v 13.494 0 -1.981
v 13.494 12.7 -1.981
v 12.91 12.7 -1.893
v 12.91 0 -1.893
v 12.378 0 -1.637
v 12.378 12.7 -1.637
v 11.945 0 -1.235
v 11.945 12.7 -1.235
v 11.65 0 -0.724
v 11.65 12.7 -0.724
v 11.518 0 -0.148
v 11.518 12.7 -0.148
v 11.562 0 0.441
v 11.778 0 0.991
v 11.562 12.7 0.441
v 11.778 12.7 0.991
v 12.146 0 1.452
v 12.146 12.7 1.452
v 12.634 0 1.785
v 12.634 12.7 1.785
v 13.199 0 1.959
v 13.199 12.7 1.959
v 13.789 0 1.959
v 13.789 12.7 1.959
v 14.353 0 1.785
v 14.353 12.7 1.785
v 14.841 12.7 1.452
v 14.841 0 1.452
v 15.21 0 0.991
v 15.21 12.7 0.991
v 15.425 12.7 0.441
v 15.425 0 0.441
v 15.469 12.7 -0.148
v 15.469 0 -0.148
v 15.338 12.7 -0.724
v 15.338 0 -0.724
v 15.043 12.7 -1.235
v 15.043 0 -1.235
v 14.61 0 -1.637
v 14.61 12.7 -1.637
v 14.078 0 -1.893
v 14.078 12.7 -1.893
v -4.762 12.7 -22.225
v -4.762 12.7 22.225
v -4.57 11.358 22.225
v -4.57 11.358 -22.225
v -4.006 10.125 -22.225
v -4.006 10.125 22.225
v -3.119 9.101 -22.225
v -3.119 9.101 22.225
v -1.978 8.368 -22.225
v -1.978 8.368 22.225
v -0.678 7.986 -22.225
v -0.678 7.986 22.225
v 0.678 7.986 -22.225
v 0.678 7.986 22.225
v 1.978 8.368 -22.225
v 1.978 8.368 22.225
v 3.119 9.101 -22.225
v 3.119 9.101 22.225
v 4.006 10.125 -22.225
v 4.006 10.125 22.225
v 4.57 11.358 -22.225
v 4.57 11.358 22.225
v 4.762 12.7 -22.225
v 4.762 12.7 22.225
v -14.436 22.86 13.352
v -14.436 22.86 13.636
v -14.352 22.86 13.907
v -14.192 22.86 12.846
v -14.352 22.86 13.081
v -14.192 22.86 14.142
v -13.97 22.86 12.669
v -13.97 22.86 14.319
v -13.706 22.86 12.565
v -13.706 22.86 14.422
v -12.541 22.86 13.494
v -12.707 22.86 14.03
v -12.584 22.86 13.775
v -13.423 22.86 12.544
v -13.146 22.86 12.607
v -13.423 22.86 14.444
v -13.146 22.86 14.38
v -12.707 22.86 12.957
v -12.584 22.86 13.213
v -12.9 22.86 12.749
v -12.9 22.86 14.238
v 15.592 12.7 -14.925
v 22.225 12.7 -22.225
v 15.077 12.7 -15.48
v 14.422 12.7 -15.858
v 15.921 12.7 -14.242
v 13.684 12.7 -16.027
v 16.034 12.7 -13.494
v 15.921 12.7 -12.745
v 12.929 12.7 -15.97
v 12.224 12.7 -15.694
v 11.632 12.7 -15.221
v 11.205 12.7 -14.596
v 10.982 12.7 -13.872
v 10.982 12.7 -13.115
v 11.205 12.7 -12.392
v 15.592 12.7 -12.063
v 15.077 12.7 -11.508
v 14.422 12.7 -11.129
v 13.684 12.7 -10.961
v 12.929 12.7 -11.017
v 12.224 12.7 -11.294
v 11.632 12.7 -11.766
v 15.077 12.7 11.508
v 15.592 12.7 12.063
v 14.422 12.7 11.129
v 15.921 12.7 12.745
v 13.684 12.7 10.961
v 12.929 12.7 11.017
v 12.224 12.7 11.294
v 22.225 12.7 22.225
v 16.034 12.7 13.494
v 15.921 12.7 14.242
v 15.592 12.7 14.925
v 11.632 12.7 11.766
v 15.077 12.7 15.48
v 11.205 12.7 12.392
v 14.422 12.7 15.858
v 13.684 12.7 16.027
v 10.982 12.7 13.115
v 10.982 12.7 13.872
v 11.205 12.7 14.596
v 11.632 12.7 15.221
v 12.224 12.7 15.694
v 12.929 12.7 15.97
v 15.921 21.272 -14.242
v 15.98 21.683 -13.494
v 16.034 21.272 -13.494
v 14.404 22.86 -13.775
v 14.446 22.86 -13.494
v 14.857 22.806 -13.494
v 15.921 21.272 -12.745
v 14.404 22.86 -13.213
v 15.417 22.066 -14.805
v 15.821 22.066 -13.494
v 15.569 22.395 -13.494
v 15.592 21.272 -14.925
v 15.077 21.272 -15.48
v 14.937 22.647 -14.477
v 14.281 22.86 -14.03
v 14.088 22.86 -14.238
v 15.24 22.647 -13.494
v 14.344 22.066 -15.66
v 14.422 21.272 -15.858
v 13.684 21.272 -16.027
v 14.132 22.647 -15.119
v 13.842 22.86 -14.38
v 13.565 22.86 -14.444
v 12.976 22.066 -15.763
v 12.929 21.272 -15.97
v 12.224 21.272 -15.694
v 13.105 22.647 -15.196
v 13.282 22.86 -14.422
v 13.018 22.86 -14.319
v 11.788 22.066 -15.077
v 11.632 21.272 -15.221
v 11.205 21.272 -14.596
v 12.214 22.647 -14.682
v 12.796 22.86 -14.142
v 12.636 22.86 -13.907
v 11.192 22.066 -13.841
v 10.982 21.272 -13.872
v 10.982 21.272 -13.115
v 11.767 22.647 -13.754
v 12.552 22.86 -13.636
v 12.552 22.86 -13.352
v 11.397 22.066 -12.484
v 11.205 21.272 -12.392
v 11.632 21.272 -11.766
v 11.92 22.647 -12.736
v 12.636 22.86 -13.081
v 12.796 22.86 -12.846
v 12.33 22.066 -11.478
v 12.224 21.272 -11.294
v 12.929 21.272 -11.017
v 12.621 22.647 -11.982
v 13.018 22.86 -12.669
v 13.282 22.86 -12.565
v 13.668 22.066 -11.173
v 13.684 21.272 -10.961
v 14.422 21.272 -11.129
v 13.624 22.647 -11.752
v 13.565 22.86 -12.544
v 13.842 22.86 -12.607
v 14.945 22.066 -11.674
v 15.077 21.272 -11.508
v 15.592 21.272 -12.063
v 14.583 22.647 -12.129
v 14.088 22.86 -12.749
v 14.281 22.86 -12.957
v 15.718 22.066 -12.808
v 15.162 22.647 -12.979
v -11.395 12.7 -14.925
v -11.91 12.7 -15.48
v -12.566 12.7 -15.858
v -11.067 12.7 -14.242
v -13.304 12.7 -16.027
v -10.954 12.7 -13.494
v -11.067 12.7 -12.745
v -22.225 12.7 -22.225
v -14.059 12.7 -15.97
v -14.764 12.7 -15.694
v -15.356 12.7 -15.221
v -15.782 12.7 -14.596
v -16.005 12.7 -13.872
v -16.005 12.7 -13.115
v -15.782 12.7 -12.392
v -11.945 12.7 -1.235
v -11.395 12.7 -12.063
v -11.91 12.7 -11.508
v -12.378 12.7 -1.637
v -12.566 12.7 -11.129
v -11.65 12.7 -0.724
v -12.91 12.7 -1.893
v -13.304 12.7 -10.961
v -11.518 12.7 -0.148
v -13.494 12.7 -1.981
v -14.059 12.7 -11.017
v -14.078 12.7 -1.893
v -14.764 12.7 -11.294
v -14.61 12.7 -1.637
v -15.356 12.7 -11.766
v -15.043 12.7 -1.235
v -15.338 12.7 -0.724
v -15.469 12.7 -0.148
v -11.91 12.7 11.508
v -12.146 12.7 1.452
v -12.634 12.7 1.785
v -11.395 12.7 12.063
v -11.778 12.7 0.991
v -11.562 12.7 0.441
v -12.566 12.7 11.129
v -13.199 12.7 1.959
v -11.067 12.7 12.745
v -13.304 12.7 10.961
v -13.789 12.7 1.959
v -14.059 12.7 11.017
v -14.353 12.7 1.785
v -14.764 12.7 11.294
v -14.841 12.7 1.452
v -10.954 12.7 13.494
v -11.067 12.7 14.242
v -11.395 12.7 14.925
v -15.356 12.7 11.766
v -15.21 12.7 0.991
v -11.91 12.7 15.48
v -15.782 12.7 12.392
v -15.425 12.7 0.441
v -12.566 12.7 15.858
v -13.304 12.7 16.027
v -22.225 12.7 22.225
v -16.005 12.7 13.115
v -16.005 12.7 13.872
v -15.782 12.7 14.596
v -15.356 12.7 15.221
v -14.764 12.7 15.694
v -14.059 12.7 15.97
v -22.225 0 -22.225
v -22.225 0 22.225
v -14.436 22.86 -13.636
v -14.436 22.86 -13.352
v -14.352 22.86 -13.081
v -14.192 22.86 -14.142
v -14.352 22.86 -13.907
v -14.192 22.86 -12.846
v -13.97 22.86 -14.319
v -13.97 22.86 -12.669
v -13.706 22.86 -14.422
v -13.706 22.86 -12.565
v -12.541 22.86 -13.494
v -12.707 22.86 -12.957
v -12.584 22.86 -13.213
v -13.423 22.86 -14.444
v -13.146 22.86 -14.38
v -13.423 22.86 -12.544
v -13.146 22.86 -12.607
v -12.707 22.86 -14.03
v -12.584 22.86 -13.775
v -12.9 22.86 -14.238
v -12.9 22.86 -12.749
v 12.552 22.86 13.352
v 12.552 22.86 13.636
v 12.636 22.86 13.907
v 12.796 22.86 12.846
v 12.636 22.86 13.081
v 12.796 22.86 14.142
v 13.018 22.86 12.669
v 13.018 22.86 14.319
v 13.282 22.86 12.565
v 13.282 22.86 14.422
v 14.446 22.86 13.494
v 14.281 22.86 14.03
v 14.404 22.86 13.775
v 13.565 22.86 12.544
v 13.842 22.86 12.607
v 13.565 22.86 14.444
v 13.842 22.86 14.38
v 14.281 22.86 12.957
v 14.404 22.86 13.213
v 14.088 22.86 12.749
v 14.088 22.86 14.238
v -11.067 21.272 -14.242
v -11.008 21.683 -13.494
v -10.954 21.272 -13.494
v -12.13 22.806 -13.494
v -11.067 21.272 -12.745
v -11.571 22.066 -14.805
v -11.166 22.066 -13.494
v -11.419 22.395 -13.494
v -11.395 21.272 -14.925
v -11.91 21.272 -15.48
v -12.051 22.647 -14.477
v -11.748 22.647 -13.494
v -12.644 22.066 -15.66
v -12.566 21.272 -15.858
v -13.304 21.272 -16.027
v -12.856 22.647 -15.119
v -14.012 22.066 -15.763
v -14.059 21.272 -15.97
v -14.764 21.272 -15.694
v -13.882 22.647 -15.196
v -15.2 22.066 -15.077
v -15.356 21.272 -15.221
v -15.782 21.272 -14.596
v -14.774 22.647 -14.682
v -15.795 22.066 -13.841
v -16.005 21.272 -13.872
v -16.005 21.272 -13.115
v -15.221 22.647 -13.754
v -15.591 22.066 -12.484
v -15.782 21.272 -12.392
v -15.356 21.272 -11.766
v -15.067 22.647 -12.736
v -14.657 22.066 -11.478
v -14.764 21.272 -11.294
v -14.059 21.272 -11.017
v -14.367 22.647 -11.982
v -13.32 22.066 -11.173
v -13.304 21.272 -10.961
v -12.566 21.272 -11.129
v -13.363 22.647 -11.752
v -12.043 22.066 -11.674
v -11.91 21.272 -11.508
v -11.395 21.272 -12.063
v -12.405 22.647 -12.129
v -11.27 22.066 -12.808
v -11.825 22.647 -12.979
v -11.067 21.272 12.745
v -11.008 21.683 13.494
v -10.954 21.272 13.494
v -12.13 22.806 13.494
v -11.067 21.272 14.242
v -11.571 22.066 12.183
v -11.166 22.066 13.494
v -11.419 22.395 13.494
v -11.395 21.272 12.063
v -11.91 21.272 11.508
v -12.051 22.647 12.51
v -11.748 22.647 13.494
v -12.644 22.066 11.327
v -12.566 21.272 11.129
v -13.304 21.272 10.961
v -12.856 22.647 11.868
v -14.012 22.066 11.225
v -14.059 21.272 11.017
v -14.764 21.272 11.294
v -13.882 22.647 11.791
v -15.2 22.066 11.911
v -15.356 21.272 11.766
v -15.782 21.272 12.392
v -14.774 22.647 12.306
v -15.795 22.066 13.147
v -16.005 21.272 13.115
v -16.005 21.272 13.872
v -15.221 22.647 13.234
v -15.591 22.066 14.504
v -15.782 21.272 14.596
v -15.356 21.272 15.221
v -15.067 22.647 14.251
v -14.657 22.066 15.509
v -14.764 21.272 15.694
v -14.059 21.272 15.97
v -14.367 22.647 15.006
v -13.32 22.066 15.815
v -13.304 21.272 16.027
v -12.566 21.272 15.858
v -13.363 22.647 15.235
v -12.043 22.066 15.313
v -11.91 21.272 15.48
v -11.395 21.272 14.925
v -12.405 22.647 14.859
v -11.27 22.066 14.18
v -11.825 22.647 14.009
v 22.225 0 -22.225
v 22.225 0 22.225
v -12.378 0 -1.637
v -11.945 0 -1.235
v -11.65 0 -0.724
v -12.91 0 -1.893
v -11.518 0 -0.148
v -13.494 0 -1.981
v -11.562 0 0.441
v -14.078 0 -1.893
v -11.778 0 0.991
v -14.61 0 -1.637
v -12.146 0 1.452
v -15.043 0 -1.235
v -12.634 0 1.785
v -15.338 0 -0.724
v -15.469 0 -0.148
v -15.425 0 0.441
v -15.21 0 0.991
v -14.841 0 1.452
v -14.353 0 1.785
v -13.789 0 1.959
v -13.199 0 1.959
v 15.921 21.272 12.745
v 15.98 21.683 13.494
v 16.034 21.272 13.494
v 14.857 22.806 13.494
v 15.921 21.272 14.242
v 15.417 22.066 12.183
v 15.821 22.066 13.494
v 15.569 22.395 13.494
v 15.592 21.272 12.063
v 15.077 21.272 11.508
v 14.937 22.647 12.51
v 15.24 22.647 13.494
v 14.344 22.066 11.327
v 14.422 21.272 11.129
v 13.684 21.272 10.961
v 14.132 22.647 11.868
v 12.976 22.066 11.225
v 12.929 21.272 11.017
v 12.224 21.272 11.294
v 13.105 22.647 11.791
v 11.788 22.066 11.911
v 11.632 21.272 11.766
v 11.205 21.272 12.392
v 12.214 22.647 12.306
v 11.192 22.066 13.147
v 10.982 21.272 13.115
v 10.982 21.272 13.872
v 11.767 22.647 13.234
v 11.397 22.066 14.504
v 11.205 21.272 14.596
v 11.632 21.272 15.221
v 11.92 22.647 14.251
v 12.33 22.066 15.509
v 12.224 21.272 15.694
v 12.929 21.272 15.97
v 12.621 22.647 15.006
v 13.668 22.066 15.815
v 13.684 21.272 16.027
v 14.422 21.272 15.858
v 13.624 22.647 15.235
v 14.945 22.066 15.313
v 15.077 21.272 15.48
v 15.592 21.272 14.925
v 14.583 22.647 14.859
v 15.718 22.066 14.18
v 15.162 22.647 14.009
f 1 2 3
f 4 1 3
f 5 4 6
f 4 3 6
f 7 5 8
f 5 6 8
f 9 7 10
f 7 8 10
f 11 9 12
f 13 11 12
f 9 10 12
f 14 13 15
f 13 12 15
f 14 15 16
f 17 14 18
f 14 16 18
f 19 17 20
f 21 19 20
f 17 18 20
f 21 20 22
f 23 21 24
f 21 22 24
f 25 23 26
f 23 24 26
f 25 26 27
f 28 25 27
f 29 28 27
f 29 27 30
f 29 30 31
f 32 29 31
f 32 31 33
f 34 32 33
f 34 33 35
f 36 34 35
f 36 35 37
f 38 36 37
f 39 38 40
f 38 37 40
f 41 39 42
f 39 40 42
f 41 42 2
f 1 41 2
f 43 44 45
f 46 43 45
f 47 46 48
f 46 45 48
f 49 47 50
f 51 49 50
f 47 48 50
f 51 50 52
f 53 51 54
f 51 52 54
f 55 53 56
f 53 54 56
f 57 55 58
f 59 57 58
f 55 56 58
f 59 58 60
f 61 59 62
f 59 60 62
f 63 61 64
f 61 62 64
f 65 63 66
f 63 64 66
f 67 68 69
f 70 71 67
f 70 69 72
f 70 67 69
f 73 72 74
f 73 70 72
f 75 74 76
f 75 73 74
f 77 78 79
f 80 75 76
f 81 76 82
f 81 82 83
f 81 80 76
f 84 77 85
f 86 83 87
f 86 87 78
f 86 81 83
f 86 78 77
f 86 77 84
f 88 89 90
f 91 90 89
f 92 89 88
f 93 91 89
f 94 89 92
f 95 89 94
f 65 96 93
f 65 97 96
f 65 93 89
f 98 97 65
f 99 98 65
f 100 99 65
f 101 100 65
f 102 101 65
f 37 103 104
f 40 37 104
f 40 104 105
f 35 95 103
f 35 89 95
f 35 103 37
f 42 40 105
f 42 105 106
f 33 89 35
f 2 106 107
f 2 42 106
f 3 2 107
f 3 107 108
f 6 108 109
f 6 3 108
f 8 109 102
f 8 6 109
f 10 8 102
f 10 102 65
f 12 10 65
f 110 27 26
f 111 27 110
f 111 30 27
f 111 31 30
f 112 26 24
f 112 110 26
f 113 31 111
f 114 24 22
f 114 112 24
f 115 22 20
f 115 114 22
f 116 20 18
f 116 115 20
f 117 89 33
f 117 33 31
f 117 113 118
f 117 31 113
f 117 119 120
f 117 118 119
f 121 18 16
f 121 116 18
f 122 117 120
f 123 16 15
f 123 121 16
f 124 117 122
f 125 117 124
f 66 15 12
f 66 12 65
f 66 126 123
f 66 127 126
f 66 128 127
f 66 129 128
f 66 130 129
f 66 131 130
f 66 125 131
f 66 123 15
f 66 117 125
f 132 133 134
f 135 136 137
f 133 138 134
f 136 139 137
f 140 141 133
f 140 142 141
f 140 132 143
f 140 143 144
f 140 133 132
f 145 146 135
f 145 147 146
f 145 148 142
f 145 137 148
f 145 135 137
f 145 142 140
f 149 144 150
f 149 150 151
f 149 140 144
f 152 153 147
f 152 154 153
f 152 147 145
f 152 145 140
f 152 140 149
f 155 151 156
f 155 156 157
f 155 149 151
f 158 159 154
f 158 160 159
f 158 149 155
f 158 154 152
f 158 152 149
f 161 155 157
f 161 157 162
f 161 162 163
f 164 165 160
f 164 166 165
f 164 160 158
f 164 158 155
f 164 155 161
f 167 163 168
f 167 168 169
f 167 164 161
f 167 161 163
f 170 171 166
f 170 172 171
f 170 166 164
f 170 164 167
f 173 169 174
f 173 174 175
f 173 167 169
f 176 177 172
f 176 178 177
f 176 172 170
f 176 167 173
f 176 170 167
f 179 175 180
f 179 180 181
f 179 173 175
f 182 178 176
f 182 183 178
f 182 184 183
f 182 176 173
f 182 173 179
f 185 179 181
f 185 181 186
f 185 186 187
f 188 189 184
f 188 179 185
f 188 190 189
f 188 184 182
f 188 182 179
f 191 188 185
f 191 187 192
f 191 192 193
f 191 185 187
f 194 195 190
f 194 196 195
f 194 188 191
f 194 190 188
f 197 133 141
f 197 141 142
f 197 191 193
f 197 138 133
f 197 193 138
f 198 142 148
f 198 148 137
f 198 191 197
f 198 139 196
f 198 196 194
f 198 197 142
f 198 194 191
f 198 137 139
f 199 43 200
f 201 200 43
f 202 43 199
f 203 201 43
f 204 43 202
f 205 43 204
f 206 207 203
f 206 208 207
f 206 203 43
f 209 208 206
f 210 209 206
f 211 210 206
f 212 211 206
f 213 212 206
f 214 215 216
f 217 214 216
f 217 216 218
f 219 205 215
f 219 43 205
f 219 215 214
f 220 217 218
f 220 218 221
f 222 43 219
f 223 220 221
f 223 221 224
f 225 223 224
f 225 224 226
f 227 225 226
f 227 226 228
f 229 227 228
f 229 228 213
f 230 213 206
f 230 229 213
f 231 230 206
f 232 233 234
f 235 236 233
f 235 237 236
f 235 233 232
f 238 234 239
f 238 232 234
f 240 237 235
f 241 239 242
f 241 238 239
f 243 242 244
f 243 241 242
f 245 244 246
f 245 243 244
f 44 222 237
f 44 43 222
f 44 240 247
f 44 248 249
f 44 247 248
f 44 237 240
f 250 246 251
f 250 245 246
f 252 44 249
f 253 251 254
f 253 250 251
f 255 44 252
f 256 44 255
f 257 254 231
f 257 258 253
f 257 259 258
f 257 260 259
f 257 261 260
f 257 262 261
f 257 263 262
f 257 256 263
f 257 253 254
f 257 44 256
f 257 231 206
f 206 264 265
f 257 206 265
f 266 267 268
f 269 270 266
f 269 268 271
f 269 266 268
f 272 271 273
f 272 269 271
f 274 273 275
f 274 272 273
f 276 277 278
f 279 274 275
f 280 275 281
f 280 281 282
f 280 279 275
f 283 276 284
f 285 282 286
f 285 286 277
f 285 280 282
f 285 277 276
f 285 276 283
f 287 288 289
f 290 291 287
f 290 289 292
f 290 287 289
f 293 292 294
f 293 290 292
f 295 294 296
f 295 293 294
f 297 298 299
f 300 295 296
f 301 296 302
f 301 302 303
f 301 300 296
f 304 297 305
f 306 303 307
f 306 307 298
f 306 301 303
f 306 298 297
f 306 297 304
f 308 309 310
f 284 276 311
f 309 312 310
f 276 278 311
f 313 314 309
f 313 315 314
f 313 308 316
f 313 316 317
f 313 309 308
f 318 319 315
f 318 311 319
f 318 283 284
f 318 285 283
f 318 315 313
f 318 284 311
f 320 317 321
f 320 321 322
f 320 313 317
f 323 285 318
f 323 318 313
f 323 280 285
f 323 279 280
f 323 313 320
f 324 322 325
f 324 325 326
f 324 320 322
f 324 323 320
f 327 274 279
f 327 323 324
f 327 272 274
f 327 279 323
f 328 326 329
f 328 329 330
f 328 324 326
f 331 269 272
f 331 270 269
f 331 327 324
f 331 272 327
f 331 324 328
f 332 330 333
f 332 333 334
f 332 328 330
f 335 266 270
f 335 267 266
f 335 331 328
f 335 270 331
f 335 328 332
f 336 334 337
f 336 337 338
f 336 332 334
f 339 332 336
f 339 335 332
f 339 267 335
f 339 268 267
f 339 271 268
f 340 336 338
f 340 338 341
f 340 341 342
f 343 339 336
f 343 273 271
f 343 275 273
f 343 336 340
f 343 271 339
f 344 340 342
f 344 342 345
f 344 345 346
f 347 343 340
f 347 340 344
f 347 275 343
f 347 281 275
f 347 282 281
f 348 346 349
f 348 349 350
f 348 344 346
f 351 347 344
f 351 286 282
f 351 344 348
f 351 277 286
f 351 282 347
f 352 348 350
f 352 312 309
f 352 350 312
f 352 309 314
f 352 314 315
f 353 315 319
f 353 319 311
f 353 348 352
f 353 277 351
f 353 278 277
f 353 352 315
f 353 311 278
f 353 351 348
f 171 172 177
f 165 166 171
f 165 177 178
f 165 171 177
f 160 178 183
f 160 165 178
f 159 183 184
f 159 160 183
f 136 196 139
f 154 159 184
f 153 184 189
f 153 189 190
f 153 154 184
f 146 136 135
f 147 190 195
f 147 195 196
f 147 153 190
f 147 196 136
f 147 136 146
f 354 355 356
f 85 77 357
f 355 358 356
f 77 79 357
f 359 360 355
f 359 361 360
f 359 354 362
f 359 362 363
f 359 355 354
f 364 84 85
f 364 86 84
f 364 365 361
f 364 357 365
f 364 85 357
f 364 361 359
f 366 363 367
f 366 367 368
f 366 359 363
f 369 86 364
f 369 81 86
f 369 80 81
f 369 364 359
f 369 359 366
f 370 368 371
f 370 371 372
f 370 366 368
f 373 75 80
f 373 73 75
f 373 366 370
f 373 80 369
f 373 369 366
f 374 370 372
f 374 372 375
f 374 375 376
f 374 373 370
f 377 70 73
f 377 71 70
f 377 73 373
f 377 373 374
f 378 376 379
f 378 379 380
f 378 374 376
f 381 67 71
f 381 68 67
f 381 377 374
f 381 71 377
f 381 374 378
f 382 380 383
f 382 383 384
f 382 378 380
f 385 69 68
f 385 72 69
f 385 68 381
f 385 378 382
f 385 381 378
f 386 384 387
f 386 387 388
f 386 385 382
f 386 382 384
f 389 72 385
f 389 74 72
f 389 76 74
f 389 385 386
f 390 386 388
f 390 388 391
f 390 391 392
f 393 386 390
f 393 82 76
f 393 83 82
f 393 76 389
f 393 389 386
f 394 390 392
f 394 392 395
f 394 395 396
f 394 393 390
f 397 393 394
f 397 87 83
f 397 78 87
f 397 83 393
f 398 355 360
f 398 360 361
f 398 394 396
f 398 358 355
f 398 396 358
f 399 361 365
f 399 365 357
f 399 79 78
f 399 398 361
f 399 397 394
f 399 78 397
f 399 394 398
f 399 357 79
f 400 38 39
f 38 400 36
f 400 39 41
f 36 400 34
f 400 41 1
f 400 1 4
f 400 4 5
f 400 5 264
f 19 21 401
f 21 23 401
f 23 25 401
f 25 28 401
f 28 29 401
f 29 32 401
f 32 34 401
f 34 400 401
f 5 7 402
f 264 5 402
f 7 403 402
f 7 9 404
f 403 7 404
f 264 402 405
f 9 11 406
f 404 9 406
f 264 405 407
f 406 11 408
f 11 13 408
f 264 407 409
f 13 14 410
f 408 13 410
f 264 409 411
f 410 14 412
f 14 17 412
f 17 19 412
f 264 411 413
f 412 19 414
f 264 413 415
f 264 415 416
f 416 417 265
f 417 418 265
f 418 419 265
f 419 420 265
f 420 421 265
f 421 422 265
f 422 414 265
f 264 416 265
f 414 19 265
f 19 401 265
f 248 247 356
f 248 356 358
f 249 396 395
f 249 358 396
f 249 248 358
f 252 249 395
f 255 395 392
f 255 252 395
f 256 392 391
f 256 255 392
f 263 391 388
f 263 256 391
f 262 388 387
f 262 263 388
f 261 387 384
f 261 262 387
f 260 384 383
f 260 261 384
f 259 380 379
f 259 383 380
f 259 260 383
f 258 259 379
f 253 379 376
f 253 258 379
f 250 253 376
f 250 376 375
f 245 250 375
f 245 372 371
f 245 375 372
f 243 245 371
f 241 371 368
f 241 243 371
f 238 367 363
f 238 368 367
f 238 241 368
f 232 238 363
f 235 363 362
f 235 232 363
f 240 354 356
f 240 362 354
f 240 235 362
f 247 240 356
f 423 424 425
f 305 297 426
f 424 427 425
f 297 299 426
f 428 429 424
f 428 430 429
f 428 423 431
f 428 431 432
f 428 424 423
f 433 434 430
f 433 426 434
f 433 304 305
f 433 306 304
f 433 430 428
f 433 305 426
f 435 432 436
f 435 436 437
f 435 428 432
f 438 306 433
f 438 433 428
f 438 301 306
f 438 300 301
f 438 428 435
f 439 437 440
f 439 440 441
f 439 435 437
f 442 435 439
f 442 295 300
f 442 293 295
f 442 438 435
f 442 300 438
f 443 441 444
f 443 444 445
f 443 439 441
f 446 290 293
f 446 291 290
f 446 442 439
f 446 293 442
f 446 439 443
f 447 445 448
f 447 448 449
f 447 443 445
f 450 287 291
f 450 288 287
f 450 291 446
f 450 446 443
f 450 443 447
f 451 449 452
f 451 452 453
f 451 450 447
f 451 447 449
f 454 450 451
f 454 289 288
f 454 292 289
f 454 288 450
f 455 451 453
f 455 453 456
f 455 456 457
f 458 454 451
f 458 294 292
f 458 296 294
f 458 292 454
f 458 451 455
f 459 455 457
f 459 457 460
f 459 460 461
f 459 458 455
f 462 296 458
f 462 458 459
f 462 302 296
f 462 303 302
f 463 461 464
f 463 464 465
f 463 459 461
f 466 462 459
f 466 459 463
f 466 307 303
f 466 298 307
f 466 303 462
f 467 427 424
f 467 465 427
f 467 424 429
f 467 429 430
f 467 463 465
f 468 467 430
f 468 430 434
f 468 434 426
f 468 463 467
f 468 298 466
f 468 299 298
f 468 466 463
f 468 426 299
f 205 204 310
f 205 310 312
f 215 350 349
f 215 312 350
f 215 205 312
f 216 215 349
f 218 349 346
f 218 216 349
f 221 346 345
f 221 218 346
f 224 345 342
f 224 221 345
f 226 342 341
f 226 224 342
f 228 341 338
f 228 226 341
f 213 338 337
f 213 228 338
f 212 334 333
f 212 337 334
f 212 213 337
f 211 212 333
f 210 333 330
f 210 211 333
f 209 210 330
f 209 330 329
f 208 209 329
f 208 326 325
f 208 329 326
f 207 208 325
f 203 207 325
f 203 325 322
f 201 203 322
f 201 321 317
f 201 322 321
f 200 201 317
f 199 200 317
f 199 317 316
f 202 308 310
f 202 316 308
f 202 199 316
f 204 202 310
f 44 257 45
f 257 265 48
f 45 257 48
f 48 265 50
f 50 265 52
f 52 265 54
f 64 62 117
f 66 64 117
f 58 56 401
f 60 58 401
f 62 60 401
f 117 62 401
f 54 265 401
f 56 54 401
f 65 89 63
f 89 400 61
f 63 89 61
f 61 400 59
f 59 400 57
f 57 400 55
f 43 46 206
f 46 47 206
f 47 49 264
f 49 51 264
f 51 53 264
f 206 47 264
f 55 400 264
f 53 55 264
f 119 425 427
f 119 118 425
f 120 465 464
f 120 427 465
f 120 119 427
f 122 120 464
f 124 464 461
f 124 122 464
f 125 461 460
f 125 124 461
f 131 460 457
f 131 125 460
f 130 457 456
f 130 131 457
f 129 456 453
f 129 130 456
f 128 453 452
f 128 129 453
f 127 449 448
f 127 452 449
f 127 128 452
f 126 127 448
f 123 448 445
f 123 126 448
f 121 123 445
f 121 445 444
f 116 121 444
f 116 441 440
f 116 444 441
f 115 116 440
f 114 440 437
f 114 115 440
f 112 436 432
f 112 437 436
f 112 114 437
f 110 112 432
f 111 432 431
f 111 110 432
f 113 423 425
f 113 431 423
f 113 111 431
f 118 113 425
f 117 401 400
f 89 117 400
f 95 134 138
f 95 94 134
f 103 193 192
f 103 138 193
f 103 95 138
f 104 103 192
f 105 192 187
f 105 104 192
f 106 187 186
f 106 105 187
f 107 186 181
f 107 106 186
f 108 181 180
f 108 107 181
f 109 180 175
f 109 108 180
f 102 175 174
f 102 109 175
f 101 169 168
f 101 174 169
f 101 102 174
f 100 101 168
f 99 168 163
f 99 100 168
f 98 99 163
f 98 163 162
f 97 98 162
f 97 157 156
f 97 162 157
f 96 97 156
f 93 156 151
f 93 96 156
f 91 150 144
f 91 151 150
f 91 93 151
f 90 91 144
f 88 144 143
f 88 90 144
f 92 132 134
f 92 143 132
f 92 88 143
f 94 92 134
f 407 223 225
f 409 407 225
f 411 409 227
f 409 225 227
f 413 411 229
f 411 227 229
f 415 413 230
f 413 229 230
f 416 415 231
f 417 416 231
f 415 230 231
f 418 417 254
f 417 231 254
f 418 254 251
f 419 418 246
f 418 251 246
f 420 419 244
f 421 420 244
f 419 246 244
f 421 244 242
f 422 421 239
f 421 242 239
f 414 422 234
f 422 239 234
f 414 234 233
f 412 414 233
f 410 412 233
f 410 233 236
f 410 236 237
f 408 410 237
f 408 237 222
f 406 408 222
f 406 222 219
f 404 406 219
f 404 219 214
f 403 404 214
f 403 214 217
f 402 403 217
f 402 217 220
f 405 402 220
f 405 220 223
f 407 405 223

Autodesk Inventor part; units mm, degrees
ref_plane "YZ Plane" through (0, 0, 0) normal (1, 0, 0) x (0, 1, 0)
ref_plane "XZ Plane" through (0, 0, 0) normal (0, 1, 0) x (-1, 0, 0)
ref_plane "XY Plane" through (0, 0, 0) normal (0, 0, 1) x (1, 0, 0)
sketch "Sketch1" plane through (0, 0, 0) normal (0, 1, 0) x (-1, 0, 0)
  line L0 (-22.225, 22.225) -> (-22.225, -22.225)
  line L1 (-22.225, -22.225) -> (22.225, -22.225)
  line L2 (22.225, -22.225) -> (22.225, 22.225)
  line L3 (22.225, 22.225) -> (-22.225, 22.225)
  line L4 (-22.225, 22.225) -> (22.225, -22.225) construction
  line L5 (-22.225, -22.225) -> (22.225, 22.225) construction
  point P0 (0, 0)
  dimension "d0" = 44.45
extrude "Extrusion1" add sketch "Sketch1" along normal blind 12.7
sketch "Sketch2" plane through (-22.225, 0, 22.225) normal (0, 0, 1) x (1, 0, 0)
  line L0 (44.45, 12.7) -> (0, 12.7) projected
  arc A0 (17.4625, 12.7) -> (26.9875, 12.7) centre (22.225, 12.7) ccw
  point P0 (22.225, 0)
  dimension "d3" = 9.525
extrude "Extrusion2" cut sketch "Sketch2" against normal through all
sketch "Sketch3" plane through (0, 0, 0) normal (0, -1, 0) x (1, 0, 0)
  line L0 (-22.225, -22.225) -> (-22.225, 22.225) projected
  line L1 (22.225, 22.225) -> (22.225, -22.225) projected
  line L2 (-22.225, 22.225) -> (-4.7625, 22.225) projected
  line L3 (4.7625, 22.225) -> (22.225, 22.225) projected
  point P0 (0, 0)
  point P1 (-13.4938, 0)
  point P2 (13.4938, 0)
  dimension "d6" = 8.7312
  dimension "d7" = 8.7312
  dimension "d22" = 22.225
  dimension "d23" = 22.225
hole "Hole1" at (-13.4938, 0, 0) at (13.4938, 0, 0) direction (0, 1, 0) diameter 3.9624 end through all thread size "10-32 UNF" class "2B" standard "ANSI Unified Screw Threads"
sketch "Sketch7" plane through (0, 12.7, 0) normal (0, 1, 0) x (1, 0, 0)
  line L0 (-13.4938, -13.4938) -> (13.4938, -13.4938) construction
  line L1 (13.4938, -13.4938) -> (13.4938, 13.4938) construction
  line L2 (13.4938, 13.4938) -> (-13.4938, 13.4938) construction
  line L3 (-13.4938, 13.4938) -> (-13.4938, -13.4938) construction
  line L4 (-13.4938, -13.4938) -> (13.4938, 13.4938) construction
  line L5 (13.4938, -13.4938) -> (-13.4938, 13.4938) construction
  line L6 (-22.225, 22.225) -> (-22.225, -22.225) construction
  line L7 (-22.225, -22.225) -> (-4.7625, -22.225) construction
  circle A0 centre (-13.4938, -13.4938) radius 2.54
  circle A1 centre (-13.4938, 13.4938) radius 2.54
  circle A2 centre (13.4938, 13.4938) radius 2.54
  circle A3 centre (13.4938, -13.4938) radius 2.54
  point P0 (0, 0)
  dimension "d26" = 8.7312
  dimension "d27" = 8.7312
  dimension "d28" = 5.08
extrude "Extrusion3" add sketch "Sketch7" along normal blind 10.16
fillet "Fillet1" radius 1.5875 4 edges at (-16.0338, 22.86, 13.4938) (-16.0338, 22.86, -13.4938) (10.9537, 22.86, -13.4938) (10.9537, 22.86, 13.4938)
sketch "Sketch4" plane through (0, 12.7, 0) normal (0, 1, 0) x (1, 0, 0)
  point P0 (-11.9062, 0)
equation "\"d0\" = baseWidth"
equation "\"d1\" = heightOfBottomSupport"
equation "\"d3\" = bottomHoleDiam"
equation "\"d4\" = deltaBottomToTop"
equation "\"d6\" = edgeToBoltHole"
equation "\"d7\" = edgeToBoltHole"
equation "\"d22\" = 0.5 * baseWidth"
equation "\"d23\" = 0.5 * baseWidth"
equation "\"d26\" = edgeToBoltHole"
equation "\"d27\" = edgeToBoltHole"
equation "\"d28\" = supportHoleDiam"
equation "\"d29\" = supportHoleLength"
equation "\"bottomHoleDiam\" = 9.525"
equation "\"baseWidth\" = 44.45"
equation "\"height\" = deltaBottomToTop + heightOfBottomHole + heightOfTopHole"
equation "\"deltaBottomToTop\" = 25.4"
equation "\"topHoleDiam\" = 9.525"
equation "\"edgeToBoltHole\" = -0.25 * bottomHoleDiam + 0.25 * baseWidth"
equation "\"washerDiam\" = 13.97"
equation "\"depthForSocketHead\" = 6.35"
equation "\"xbottomHoleDiam\" = 9.525"
equation "\"baseLength\" = 38.1"
equation "\"heightOfBottomSupport\" = 12.7"
equation "\"supportHoleDiam\" = 5.08"
equation "\"supportHoleLength\" = 10.16"
equation "\"heightOfBottomHole\" = 11.1125"
equation "\"heightOfTopHole\" = 11.1125"
properties part number "BottomOfSquareSupport" material "PC/ABS Plastic"
